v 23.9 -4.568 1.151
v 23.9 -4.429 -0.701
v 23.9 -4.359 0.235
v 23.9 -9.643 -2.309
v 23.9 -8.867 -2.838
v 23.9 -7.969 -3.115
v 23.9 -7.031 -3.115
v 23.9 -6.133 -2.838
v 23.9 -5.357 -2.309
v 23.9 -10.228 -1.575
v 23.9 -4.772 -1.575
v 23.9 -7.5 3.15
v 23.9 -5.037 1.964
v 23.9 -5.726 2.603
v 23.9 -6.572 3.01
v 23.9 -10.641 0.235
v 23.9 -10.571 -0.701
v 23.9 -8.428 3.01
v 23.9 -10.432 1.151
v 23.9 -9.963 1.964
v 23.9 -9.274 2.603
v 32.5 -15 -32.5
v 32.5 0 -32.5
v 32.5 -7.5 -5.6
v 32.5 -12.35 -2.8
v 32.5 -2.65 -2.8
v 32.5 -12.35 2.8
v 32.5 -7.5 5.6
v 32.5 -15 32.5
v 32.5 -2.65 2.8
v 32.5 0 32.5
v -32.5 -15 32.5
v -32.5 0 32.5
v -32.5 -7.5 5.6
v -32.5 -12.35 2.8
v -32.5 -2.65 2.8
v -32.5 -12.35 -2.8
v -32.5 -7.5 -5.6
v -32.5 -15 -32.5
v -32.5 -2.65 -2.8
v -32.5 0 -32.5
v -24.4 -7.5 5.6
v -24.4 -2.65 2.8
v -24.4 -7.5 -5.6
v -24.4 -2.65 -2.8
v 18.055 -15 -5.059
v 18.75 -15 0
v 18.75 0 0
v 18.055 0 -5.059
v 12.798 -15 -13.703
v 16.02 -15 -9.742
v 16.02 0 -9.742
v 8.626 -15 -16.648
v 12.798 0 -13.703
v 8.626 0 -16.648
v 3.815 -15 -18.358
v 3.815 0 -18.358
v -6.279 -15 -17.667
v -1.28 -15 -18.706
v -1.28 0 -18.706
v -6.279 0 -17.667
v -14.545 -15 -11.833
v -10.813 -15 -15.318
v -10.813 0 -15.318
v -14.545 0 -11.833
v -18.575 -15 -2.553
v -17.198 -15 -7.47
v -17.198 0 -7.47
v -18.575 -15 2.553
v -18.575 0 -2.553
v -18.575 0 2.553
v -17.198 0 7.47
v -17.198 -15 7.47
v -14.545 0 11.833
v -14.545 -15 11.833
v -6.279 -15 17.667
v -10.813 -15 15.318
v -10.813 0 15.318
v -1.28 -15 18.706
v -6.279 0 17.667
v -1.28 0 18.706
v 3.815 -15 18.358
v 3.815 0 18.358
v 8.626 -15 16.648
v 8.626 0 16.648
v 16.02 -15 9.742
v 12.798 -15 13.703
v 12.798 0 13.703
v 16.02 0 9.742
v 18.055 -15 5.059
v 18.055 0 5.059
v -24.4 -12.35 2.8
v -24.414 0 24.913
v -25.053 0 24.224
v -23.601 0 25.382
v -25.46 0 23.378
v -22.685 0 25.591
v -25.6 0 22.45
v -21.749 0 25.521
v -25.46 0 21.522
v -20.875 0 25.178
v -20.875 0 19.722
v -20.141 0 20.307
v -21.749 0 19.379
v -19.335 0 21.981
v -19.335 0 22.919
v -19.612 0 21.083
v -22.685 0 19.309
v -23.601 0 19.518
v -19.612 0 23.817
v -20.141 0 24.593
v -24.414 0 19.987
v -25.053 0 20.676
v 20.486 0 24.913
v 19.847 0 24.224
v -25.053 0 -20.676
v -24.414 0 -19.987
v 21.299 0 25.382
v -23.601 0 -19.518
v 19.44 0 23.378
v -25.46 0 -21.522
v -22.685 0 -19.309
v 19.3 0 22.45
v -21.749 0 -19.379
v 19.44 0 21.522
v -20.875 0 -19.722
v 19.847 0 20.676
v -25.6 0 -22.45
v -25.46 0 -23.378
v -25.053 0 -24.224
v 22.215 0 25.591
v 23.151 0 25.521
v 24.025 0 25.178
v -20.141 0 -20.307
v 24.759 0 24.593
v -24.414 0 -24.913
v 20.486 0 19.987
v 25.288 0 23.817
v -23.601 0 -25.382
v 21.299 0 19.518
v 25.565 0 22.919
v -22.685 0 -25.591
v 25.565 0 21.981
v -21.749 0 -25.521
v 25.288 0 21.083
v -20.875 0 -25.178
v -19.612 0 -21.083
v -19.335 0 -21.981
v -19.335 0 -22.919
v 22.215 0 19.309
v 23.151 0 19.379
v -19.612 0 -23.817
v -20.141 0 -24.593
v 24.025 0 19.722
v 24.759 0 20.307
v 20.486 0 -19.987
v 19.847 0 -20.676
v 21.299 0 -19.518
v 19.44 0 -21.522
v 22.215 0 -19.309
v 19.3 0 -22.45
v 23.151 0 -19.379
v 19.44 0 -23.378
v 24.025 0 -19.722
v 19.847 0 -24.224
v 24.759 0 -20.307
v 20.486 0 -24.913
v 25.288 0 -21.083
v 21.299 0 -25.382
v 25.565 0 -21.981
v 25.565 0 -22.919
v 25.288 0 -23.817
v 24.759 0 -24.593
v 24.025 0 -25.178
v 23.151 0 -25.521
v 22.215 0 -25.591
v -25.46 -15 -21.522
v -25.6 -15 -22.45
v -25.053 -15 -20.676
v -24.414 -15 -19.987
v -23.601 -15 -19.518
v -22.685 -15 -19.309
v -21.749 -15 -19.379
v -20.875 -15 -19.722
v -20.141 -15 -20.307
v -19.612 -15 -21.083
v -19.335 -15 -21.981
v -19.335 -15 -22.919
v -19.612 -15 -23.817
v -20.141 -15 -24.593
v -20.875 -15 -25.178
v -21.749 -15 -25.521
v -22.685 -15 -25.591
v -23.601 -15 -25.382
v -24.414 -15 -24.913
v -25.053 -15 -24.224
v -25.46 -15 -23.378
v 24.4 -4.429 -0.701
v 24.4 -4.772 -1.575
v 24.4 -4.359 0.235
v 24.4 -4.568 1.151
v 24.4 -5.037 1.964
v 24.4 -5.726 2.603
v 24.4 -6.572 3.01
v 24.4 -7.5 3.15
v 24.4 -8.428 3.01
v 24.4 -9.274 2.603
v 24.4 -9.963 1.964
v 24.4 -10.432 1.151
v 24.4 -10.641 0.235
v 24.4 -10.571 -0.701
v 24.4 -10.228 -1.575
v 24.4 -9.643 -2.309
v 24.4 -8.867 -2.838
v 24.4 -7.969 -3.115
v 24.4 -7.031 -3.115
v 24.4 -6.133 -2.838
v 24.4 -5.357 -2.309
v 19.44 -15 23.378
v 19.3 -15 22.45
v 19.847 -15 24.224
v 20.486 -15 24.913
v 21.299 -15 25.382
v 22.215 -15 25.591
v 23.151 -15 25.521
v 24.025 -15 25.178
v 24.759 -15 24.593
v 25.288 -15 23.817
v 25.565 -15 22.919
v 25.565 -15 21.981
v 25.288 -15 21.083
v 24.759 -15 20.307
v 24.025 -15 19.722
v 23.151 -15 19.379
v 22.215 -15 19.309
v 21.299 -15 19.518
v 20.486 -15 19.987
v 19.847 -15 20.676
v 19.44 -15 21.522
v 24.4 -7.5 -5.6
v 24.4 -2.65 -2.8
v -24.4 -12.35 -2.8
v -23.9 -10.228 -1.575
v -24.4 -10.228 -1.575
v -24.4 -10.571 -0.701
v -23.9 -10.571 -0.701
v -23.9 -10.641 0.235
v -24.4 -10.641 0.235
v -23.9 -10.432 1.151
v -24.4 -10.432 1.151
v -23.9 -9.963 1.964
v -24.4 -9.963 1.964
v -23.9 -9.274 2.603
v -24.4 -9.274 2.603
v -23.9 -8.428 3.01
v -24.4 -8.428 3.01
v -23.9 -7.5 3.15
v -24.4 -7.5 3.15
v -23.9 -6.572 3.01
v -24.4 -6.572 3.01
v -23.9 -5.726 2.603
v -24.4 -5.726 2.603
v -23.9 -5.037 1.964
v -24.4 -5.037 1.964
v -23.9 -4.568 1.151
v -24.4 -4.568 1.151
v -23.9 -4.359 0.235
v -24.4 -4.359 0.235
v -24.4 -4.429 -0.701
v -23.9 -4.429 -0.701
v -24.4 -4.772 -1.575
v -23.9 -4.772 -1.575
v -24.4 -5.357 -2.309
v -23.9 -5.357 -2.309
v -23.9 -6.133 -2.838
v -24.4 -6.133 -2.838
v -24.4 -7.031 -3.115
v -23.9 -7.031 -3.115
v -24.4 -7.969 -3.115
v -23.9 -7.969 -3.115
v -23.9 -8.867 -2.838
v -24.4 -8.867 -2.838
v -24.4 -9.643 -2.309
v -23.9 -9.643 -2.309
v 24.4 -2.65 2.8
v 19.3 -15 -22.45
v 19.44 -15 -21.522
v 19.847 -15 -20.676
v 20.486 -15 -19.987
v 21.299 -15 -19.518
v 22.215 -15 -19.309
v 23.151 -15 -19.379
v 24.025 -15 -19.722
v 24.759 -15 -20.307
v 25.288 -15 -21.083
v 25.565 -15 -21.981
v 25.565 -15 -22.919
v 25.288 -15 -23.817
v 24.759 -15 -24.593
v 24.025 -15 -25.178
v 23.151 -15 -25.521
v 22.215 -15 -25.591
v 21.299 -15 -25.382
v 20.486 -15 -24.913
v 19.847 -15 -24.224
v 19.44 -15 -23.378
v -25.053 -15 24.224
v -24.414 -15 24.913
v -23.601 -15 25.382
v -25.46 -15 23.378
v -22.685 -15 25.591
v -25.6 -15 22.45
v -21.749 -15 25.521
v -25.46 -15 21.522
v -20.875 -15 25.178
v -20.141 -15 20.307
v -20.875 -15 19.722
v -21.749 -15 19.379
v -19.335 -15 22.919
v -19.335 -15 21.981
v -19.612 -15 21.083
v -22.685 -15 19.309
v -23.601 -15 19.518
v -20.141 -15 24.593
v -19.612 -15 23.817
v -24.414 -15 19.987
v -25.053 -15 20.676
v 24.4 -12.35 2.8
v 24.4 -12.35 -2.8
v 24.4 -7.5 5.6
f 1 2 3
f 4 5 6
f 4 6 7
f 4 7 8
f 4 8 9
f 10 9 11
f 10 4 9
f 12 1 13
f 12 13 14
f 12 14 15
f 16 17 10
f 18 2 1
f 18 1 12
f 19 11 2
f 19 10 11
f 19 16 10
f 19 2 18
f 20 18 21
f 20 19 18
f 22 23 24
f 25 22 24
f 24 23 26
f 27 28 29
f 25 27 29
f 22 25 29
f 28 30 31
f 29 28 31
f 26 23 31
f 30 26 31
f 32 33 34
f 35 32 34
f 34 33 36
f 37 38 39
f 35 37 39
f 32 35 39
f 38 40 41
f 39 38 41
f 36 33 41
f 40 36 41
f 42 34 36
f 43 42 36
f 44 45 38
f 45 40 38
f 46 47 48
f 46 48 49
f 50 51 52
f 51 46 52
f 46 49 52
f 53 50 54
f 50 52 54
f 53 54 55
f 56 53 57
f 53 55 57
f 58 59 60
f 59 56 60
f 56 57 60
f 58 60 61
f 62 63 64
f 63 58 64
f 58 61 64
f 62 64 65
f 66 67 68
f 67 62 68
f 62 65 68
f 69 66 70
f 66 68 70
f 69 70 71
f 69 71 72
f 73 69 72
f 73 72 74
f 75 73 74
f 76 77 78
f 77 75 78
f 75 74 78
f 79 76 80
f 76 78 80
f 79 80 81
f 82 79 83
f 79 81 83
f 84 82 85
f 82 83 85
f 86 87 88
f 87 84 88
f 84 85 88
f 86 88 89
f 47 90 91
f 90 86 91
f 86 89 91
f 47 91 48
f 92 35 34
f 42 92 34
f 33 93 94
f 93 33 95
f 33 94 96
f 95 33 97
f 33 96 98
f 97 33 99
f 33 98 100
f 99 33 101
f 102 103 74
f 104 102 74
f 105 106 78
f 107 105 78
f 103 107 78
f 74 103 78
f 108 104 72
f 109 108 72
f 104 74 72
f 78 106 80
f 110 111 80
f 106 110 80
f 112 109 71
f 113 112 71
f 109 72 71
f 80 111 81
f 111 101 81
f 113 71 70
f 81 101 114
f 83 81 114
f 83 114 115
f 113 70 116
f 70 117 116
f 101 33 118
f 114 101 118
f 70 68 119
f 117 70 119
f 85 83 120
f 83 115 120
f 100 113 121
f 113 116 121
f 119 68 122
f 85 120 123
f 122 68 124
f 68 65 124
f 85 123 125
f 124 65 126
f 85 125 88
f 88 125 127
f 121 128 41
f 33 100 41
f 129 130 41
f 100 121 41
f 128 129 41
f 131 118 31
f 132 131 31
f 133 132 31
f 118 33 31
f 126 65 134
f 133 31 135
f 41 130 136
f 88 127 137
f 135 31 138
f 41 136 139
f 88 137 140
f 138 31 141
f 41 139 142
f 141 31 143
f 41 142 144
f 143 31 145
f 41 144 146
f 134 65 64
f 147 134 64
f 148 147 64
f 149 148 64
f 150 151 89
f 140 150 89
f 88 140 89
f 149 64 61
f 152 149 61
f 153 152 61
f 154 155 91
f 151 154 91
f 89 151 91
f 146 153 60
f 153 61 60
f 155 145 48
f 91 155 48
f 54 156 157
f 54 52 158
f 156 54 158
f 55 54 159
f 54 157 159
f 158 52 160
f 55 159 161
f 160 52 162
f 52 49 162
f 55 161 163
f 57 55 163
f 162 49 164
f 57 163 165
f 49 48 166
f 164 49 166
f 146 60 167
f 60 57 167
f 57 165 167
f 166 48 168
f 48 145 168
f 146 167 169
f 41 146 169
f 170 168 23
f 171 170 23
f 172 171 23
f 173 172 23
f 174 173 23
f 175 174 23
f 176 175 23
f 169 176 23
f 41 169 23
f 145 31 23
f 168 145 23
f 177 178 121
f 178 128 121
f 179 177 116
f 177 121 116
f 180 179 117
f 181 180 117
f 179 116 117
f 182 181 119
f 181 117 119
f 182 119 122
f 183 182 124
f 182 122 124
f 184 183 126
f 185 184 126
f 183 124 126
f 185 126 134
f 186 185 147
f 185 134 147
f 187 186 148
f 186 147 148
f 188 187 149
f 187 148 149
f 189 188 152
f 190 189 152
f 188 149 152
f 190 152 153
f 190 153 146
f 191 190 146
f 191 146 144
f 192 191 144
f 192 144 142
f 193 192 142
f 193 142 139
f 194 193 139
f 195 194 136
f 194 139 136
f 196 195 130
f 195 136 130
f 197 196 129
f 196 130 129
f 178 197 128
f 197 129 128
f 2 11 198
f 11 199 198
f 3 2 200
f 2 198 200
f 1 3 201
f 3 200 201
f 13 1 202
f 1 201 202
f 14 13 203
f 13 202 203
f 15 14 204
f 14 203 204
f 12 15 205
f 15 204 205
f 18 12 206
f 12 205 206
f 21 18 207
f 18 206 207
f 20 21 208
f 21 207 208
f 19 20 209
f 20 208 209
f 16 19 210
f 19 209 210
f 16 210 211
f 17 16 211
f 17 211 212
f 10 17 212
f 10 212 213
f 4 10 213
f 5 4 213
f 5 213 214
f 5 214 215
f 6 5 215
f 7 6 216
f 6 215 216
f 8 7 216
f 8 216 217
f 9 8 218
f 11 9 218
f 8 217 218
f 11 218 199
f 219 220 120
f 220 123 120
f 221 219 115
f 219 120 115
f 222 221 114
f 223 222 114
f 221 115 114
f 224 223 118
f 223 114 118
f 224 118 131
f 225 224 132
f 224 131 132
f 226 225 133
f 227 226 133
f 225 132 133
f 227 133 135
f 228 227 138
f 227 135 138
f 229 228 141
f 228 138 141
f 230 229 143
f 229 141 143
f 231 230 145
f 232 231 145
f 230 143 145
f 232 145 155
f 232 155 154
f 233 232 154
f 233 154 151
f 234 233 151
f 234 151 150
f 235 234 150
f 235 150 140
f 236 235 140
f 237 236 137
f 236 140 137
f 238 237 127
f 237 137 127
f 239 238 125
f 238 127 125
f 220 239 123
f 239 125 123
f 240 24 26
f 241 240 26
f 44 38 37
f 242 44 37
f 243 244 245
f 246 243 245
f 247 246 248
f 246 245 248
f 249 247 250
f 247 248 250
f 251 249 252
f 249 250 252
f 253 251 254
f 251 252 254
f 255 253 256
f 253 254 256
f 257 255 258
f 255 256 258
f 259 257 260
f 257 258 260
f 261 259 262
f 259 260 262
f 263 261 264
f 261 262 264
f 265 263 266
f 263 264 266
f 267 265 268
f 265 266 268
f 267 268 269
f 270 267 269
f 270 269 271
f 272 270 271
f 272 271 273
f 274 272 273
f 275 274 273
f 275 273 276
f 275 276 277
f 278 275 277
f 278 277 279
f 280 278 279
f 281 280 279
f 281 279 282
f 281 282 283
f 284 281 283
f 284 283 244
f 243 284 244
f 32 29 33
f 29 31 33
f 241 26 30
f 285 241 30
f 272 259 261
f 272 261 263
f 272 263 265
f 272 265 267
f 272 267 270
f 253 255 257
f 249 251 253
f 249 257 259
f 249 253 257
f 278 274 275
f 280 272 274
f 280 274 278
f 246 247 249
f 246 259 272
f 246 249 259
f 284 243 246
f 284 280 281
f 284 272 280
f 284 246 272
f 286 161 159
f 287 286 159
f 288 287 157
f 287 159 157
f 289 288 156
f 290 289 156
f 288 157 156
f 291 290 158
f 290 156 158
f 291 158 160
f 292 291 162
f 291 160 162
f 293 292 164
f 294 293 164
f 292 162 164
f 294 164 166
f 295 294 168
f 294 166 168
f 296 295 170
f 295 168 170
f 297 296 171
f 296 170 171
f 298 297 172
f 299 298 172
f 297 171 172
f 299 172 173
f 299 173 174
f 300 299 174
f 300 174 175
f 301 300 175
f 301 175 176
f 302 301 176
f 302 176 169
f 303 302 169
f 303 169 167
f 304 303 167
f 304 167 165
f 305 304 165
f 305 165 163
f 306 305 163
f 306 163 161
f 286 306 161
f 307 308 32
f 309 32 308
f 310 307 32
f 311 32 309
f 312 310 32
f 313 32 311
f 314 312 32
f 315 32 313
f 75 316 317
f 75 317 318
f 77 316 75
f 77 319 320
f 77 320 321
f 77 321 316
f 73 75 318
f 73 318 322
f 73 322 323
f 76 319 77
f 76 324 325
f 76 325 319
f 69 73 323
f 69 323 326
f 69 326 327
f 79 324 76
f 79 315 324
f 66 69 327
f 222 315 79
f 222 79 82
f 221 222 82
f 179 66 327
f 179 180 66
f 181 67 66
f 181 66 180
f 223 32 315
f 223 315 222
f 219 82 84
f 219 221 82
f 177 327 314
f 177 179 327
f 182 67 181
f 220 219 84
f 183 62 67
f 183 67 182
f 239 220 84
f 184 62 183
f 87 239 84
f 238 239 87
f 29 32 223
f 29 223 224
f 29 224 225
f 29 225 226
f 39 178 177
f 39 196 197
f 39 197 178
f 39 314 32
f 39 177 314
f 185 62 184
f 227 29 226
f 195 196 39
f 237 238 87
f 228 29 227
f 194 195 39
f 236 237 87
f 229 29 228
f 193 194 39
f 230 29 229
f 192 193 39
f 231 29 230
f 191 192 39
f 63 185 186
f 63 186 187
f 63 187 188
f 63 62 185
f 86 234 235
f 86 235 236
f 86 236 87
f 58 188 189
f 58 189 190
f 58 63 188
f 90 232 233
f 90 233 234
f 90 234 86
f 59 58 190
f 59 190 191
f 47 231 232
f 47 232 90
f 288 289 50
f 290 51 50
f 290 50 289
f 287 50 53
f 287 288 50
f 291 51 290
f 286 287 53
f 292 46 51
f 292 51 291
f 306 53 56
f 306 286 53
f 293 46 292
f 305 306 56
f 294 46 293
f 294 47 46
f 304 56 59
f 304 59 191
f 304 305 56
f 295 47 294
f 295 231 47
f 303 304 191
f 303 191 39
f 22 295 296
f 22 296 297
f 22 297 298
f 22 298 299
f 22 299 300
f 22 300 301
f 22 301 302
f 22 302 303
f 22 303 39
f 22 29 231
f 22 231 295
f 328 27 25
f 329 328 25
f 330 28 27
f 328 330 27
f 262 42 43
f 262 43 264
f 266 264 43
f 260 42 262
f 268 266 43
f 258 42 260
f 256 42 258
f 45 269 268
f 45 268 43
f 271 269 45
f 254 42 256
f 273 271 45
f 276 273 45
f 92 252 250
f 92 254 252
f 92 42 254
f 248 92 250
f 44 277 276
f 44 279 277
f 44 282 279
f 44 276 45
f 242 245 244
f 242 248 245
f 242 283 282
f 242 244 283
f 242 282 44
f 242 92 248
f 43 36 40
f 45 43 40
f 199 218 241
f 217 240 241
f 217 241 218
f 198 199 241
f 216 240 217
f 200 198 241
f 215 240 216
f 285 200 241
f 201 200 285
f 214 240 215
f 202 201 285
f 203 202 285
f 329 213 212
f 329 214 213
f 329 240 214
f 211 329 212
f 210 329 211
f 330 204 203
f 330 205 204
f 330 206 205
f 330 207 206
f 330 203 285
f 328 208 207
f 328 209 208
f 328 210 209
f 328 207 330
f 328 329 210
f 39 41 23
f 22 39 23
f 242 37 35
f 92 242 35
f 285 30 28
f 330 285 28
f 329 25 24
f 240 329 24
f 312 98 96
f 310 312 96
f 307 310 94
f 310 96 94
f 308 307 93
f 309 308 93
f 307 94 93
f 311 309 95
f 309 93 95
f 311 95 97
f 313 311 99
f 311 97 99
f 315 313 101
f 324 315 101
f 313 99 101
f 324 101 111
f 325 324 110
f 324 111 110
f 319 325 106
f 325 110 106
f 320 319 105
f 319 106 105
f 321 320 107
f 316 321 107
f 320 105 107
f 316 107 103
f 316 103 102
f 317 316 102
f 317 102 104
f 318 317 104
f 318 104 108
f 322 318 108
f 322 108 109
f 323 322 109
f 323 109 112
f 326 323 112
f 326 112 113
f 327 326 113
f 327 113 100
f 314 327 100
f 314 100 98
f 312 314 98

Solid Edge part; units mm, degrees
sketch "Sketch1" plane through (0, 0, 0) normal (0, -1, 0) x (1, 0, 0)
  line L0 (32.5, -32.5) -> (32.5, 32.5)
  line L1 (32.5, 32.5) -> (-32.5, 32.5)
  line L2 (-32.5, 32.5) -> (-32.5, -32.5)
  line L3 (-32.5, -32.5) -> (32.5, -32.5)
  circle A0 centre (0, 0) radius 18.75
  dimension "D1" = 37.5
  dimension "D2" = 65
  dimension "D3" = 65
extrude "Protrusion1" add sketch "Sketch1" along normal blind 15
sketch "Sketch2" plane through (-32.5, -7.5, 0) normal (-1, 0, 0) x (0, -1, 0)
  line L0 (4.85, 2.8001) -> (0, 5.6003)
  line L1 (0, 5.6003) -> (-4.85, 2.8001)
  line L2 (-4.85, 2.8001) -> (-4.85, -2.8001)
  line L3 (-4.85, -2.8001) -> (0, -5.6003)
  line L4 (0, -5.6003) -> (4.85, -2.8001)
  line L5 (4.85, -2.8001) -> (4.85, 2.8001)
extrude "ExtrudedCutout_2" cut sketch "Sketch2" against normal blind 8.1
sketch "Sketch3" plane through (32.5, -7.5, 0) normal (1, 0, 0) x (0, 1, 0)
  line L0 (-4.85, -2.8001) -> (0, -5.6003)
  line L1 (0, -5.6003) -> (4.85, -2.8001)
  line L2 (4.85, -2.8001) -> (4.85, 2.8001)
  line L3 (4.85, 2.8001) -> (0, 5.6003)
  line L4 (0, 5.6003) -> (-4.85, 2.8001)
  line L5 (-4.85, 2.8001) -> (-4.85, -2.8001)
extrude "ExtrudedCutout_3" cut sketch "Sketch3" against normal blind 8.1
sketch "Sketch4" plane through (-24.4, -7.5, 0) normal (-1, 0, 0) x (0, -0.866, -0.5)
  circle A0 centre (0, 0) radius 3.15
extrude "ExtrudedCutout_4" cut sketch "Sketch4" against normal blind 0.5
sketch "Sketch5" plane through (24.4, -7.5, 0) normal (1, 0, 0) x (0, 0.866, -0.5)
  circle A0 centre (0, 0) radius 3.15
extrude "ExtrudedCutout_5" cut sketch "Sketch5" against normal blind 0.5
sketch "Sketch6" plane through (0, 0, 0) normal (0, 1, 0) x (-1, 0, 0)
  circle A0 centre (-22.45, 22.45) radius 3.15
  circle A1 centre (22.45, 22.45) radius 3.15
  circle A2 centre (22.45, -22.45) radius 3.15
  circle A3 centre (-22.45, -22.45) radius 3.15
  dimension "D1" = 6.3
  dimension "D2" = 6.3
  dimension "D3" = 6.3
  dimension "D4" = 6.3
  dimension "D5" = 22.45
  dimension "D6" = 44.9
  dimension "D7" = 44.9
  dimension "D8" = 22.45
extrude "Cutout1" cut sketch "Sketch6" against normal up to next
